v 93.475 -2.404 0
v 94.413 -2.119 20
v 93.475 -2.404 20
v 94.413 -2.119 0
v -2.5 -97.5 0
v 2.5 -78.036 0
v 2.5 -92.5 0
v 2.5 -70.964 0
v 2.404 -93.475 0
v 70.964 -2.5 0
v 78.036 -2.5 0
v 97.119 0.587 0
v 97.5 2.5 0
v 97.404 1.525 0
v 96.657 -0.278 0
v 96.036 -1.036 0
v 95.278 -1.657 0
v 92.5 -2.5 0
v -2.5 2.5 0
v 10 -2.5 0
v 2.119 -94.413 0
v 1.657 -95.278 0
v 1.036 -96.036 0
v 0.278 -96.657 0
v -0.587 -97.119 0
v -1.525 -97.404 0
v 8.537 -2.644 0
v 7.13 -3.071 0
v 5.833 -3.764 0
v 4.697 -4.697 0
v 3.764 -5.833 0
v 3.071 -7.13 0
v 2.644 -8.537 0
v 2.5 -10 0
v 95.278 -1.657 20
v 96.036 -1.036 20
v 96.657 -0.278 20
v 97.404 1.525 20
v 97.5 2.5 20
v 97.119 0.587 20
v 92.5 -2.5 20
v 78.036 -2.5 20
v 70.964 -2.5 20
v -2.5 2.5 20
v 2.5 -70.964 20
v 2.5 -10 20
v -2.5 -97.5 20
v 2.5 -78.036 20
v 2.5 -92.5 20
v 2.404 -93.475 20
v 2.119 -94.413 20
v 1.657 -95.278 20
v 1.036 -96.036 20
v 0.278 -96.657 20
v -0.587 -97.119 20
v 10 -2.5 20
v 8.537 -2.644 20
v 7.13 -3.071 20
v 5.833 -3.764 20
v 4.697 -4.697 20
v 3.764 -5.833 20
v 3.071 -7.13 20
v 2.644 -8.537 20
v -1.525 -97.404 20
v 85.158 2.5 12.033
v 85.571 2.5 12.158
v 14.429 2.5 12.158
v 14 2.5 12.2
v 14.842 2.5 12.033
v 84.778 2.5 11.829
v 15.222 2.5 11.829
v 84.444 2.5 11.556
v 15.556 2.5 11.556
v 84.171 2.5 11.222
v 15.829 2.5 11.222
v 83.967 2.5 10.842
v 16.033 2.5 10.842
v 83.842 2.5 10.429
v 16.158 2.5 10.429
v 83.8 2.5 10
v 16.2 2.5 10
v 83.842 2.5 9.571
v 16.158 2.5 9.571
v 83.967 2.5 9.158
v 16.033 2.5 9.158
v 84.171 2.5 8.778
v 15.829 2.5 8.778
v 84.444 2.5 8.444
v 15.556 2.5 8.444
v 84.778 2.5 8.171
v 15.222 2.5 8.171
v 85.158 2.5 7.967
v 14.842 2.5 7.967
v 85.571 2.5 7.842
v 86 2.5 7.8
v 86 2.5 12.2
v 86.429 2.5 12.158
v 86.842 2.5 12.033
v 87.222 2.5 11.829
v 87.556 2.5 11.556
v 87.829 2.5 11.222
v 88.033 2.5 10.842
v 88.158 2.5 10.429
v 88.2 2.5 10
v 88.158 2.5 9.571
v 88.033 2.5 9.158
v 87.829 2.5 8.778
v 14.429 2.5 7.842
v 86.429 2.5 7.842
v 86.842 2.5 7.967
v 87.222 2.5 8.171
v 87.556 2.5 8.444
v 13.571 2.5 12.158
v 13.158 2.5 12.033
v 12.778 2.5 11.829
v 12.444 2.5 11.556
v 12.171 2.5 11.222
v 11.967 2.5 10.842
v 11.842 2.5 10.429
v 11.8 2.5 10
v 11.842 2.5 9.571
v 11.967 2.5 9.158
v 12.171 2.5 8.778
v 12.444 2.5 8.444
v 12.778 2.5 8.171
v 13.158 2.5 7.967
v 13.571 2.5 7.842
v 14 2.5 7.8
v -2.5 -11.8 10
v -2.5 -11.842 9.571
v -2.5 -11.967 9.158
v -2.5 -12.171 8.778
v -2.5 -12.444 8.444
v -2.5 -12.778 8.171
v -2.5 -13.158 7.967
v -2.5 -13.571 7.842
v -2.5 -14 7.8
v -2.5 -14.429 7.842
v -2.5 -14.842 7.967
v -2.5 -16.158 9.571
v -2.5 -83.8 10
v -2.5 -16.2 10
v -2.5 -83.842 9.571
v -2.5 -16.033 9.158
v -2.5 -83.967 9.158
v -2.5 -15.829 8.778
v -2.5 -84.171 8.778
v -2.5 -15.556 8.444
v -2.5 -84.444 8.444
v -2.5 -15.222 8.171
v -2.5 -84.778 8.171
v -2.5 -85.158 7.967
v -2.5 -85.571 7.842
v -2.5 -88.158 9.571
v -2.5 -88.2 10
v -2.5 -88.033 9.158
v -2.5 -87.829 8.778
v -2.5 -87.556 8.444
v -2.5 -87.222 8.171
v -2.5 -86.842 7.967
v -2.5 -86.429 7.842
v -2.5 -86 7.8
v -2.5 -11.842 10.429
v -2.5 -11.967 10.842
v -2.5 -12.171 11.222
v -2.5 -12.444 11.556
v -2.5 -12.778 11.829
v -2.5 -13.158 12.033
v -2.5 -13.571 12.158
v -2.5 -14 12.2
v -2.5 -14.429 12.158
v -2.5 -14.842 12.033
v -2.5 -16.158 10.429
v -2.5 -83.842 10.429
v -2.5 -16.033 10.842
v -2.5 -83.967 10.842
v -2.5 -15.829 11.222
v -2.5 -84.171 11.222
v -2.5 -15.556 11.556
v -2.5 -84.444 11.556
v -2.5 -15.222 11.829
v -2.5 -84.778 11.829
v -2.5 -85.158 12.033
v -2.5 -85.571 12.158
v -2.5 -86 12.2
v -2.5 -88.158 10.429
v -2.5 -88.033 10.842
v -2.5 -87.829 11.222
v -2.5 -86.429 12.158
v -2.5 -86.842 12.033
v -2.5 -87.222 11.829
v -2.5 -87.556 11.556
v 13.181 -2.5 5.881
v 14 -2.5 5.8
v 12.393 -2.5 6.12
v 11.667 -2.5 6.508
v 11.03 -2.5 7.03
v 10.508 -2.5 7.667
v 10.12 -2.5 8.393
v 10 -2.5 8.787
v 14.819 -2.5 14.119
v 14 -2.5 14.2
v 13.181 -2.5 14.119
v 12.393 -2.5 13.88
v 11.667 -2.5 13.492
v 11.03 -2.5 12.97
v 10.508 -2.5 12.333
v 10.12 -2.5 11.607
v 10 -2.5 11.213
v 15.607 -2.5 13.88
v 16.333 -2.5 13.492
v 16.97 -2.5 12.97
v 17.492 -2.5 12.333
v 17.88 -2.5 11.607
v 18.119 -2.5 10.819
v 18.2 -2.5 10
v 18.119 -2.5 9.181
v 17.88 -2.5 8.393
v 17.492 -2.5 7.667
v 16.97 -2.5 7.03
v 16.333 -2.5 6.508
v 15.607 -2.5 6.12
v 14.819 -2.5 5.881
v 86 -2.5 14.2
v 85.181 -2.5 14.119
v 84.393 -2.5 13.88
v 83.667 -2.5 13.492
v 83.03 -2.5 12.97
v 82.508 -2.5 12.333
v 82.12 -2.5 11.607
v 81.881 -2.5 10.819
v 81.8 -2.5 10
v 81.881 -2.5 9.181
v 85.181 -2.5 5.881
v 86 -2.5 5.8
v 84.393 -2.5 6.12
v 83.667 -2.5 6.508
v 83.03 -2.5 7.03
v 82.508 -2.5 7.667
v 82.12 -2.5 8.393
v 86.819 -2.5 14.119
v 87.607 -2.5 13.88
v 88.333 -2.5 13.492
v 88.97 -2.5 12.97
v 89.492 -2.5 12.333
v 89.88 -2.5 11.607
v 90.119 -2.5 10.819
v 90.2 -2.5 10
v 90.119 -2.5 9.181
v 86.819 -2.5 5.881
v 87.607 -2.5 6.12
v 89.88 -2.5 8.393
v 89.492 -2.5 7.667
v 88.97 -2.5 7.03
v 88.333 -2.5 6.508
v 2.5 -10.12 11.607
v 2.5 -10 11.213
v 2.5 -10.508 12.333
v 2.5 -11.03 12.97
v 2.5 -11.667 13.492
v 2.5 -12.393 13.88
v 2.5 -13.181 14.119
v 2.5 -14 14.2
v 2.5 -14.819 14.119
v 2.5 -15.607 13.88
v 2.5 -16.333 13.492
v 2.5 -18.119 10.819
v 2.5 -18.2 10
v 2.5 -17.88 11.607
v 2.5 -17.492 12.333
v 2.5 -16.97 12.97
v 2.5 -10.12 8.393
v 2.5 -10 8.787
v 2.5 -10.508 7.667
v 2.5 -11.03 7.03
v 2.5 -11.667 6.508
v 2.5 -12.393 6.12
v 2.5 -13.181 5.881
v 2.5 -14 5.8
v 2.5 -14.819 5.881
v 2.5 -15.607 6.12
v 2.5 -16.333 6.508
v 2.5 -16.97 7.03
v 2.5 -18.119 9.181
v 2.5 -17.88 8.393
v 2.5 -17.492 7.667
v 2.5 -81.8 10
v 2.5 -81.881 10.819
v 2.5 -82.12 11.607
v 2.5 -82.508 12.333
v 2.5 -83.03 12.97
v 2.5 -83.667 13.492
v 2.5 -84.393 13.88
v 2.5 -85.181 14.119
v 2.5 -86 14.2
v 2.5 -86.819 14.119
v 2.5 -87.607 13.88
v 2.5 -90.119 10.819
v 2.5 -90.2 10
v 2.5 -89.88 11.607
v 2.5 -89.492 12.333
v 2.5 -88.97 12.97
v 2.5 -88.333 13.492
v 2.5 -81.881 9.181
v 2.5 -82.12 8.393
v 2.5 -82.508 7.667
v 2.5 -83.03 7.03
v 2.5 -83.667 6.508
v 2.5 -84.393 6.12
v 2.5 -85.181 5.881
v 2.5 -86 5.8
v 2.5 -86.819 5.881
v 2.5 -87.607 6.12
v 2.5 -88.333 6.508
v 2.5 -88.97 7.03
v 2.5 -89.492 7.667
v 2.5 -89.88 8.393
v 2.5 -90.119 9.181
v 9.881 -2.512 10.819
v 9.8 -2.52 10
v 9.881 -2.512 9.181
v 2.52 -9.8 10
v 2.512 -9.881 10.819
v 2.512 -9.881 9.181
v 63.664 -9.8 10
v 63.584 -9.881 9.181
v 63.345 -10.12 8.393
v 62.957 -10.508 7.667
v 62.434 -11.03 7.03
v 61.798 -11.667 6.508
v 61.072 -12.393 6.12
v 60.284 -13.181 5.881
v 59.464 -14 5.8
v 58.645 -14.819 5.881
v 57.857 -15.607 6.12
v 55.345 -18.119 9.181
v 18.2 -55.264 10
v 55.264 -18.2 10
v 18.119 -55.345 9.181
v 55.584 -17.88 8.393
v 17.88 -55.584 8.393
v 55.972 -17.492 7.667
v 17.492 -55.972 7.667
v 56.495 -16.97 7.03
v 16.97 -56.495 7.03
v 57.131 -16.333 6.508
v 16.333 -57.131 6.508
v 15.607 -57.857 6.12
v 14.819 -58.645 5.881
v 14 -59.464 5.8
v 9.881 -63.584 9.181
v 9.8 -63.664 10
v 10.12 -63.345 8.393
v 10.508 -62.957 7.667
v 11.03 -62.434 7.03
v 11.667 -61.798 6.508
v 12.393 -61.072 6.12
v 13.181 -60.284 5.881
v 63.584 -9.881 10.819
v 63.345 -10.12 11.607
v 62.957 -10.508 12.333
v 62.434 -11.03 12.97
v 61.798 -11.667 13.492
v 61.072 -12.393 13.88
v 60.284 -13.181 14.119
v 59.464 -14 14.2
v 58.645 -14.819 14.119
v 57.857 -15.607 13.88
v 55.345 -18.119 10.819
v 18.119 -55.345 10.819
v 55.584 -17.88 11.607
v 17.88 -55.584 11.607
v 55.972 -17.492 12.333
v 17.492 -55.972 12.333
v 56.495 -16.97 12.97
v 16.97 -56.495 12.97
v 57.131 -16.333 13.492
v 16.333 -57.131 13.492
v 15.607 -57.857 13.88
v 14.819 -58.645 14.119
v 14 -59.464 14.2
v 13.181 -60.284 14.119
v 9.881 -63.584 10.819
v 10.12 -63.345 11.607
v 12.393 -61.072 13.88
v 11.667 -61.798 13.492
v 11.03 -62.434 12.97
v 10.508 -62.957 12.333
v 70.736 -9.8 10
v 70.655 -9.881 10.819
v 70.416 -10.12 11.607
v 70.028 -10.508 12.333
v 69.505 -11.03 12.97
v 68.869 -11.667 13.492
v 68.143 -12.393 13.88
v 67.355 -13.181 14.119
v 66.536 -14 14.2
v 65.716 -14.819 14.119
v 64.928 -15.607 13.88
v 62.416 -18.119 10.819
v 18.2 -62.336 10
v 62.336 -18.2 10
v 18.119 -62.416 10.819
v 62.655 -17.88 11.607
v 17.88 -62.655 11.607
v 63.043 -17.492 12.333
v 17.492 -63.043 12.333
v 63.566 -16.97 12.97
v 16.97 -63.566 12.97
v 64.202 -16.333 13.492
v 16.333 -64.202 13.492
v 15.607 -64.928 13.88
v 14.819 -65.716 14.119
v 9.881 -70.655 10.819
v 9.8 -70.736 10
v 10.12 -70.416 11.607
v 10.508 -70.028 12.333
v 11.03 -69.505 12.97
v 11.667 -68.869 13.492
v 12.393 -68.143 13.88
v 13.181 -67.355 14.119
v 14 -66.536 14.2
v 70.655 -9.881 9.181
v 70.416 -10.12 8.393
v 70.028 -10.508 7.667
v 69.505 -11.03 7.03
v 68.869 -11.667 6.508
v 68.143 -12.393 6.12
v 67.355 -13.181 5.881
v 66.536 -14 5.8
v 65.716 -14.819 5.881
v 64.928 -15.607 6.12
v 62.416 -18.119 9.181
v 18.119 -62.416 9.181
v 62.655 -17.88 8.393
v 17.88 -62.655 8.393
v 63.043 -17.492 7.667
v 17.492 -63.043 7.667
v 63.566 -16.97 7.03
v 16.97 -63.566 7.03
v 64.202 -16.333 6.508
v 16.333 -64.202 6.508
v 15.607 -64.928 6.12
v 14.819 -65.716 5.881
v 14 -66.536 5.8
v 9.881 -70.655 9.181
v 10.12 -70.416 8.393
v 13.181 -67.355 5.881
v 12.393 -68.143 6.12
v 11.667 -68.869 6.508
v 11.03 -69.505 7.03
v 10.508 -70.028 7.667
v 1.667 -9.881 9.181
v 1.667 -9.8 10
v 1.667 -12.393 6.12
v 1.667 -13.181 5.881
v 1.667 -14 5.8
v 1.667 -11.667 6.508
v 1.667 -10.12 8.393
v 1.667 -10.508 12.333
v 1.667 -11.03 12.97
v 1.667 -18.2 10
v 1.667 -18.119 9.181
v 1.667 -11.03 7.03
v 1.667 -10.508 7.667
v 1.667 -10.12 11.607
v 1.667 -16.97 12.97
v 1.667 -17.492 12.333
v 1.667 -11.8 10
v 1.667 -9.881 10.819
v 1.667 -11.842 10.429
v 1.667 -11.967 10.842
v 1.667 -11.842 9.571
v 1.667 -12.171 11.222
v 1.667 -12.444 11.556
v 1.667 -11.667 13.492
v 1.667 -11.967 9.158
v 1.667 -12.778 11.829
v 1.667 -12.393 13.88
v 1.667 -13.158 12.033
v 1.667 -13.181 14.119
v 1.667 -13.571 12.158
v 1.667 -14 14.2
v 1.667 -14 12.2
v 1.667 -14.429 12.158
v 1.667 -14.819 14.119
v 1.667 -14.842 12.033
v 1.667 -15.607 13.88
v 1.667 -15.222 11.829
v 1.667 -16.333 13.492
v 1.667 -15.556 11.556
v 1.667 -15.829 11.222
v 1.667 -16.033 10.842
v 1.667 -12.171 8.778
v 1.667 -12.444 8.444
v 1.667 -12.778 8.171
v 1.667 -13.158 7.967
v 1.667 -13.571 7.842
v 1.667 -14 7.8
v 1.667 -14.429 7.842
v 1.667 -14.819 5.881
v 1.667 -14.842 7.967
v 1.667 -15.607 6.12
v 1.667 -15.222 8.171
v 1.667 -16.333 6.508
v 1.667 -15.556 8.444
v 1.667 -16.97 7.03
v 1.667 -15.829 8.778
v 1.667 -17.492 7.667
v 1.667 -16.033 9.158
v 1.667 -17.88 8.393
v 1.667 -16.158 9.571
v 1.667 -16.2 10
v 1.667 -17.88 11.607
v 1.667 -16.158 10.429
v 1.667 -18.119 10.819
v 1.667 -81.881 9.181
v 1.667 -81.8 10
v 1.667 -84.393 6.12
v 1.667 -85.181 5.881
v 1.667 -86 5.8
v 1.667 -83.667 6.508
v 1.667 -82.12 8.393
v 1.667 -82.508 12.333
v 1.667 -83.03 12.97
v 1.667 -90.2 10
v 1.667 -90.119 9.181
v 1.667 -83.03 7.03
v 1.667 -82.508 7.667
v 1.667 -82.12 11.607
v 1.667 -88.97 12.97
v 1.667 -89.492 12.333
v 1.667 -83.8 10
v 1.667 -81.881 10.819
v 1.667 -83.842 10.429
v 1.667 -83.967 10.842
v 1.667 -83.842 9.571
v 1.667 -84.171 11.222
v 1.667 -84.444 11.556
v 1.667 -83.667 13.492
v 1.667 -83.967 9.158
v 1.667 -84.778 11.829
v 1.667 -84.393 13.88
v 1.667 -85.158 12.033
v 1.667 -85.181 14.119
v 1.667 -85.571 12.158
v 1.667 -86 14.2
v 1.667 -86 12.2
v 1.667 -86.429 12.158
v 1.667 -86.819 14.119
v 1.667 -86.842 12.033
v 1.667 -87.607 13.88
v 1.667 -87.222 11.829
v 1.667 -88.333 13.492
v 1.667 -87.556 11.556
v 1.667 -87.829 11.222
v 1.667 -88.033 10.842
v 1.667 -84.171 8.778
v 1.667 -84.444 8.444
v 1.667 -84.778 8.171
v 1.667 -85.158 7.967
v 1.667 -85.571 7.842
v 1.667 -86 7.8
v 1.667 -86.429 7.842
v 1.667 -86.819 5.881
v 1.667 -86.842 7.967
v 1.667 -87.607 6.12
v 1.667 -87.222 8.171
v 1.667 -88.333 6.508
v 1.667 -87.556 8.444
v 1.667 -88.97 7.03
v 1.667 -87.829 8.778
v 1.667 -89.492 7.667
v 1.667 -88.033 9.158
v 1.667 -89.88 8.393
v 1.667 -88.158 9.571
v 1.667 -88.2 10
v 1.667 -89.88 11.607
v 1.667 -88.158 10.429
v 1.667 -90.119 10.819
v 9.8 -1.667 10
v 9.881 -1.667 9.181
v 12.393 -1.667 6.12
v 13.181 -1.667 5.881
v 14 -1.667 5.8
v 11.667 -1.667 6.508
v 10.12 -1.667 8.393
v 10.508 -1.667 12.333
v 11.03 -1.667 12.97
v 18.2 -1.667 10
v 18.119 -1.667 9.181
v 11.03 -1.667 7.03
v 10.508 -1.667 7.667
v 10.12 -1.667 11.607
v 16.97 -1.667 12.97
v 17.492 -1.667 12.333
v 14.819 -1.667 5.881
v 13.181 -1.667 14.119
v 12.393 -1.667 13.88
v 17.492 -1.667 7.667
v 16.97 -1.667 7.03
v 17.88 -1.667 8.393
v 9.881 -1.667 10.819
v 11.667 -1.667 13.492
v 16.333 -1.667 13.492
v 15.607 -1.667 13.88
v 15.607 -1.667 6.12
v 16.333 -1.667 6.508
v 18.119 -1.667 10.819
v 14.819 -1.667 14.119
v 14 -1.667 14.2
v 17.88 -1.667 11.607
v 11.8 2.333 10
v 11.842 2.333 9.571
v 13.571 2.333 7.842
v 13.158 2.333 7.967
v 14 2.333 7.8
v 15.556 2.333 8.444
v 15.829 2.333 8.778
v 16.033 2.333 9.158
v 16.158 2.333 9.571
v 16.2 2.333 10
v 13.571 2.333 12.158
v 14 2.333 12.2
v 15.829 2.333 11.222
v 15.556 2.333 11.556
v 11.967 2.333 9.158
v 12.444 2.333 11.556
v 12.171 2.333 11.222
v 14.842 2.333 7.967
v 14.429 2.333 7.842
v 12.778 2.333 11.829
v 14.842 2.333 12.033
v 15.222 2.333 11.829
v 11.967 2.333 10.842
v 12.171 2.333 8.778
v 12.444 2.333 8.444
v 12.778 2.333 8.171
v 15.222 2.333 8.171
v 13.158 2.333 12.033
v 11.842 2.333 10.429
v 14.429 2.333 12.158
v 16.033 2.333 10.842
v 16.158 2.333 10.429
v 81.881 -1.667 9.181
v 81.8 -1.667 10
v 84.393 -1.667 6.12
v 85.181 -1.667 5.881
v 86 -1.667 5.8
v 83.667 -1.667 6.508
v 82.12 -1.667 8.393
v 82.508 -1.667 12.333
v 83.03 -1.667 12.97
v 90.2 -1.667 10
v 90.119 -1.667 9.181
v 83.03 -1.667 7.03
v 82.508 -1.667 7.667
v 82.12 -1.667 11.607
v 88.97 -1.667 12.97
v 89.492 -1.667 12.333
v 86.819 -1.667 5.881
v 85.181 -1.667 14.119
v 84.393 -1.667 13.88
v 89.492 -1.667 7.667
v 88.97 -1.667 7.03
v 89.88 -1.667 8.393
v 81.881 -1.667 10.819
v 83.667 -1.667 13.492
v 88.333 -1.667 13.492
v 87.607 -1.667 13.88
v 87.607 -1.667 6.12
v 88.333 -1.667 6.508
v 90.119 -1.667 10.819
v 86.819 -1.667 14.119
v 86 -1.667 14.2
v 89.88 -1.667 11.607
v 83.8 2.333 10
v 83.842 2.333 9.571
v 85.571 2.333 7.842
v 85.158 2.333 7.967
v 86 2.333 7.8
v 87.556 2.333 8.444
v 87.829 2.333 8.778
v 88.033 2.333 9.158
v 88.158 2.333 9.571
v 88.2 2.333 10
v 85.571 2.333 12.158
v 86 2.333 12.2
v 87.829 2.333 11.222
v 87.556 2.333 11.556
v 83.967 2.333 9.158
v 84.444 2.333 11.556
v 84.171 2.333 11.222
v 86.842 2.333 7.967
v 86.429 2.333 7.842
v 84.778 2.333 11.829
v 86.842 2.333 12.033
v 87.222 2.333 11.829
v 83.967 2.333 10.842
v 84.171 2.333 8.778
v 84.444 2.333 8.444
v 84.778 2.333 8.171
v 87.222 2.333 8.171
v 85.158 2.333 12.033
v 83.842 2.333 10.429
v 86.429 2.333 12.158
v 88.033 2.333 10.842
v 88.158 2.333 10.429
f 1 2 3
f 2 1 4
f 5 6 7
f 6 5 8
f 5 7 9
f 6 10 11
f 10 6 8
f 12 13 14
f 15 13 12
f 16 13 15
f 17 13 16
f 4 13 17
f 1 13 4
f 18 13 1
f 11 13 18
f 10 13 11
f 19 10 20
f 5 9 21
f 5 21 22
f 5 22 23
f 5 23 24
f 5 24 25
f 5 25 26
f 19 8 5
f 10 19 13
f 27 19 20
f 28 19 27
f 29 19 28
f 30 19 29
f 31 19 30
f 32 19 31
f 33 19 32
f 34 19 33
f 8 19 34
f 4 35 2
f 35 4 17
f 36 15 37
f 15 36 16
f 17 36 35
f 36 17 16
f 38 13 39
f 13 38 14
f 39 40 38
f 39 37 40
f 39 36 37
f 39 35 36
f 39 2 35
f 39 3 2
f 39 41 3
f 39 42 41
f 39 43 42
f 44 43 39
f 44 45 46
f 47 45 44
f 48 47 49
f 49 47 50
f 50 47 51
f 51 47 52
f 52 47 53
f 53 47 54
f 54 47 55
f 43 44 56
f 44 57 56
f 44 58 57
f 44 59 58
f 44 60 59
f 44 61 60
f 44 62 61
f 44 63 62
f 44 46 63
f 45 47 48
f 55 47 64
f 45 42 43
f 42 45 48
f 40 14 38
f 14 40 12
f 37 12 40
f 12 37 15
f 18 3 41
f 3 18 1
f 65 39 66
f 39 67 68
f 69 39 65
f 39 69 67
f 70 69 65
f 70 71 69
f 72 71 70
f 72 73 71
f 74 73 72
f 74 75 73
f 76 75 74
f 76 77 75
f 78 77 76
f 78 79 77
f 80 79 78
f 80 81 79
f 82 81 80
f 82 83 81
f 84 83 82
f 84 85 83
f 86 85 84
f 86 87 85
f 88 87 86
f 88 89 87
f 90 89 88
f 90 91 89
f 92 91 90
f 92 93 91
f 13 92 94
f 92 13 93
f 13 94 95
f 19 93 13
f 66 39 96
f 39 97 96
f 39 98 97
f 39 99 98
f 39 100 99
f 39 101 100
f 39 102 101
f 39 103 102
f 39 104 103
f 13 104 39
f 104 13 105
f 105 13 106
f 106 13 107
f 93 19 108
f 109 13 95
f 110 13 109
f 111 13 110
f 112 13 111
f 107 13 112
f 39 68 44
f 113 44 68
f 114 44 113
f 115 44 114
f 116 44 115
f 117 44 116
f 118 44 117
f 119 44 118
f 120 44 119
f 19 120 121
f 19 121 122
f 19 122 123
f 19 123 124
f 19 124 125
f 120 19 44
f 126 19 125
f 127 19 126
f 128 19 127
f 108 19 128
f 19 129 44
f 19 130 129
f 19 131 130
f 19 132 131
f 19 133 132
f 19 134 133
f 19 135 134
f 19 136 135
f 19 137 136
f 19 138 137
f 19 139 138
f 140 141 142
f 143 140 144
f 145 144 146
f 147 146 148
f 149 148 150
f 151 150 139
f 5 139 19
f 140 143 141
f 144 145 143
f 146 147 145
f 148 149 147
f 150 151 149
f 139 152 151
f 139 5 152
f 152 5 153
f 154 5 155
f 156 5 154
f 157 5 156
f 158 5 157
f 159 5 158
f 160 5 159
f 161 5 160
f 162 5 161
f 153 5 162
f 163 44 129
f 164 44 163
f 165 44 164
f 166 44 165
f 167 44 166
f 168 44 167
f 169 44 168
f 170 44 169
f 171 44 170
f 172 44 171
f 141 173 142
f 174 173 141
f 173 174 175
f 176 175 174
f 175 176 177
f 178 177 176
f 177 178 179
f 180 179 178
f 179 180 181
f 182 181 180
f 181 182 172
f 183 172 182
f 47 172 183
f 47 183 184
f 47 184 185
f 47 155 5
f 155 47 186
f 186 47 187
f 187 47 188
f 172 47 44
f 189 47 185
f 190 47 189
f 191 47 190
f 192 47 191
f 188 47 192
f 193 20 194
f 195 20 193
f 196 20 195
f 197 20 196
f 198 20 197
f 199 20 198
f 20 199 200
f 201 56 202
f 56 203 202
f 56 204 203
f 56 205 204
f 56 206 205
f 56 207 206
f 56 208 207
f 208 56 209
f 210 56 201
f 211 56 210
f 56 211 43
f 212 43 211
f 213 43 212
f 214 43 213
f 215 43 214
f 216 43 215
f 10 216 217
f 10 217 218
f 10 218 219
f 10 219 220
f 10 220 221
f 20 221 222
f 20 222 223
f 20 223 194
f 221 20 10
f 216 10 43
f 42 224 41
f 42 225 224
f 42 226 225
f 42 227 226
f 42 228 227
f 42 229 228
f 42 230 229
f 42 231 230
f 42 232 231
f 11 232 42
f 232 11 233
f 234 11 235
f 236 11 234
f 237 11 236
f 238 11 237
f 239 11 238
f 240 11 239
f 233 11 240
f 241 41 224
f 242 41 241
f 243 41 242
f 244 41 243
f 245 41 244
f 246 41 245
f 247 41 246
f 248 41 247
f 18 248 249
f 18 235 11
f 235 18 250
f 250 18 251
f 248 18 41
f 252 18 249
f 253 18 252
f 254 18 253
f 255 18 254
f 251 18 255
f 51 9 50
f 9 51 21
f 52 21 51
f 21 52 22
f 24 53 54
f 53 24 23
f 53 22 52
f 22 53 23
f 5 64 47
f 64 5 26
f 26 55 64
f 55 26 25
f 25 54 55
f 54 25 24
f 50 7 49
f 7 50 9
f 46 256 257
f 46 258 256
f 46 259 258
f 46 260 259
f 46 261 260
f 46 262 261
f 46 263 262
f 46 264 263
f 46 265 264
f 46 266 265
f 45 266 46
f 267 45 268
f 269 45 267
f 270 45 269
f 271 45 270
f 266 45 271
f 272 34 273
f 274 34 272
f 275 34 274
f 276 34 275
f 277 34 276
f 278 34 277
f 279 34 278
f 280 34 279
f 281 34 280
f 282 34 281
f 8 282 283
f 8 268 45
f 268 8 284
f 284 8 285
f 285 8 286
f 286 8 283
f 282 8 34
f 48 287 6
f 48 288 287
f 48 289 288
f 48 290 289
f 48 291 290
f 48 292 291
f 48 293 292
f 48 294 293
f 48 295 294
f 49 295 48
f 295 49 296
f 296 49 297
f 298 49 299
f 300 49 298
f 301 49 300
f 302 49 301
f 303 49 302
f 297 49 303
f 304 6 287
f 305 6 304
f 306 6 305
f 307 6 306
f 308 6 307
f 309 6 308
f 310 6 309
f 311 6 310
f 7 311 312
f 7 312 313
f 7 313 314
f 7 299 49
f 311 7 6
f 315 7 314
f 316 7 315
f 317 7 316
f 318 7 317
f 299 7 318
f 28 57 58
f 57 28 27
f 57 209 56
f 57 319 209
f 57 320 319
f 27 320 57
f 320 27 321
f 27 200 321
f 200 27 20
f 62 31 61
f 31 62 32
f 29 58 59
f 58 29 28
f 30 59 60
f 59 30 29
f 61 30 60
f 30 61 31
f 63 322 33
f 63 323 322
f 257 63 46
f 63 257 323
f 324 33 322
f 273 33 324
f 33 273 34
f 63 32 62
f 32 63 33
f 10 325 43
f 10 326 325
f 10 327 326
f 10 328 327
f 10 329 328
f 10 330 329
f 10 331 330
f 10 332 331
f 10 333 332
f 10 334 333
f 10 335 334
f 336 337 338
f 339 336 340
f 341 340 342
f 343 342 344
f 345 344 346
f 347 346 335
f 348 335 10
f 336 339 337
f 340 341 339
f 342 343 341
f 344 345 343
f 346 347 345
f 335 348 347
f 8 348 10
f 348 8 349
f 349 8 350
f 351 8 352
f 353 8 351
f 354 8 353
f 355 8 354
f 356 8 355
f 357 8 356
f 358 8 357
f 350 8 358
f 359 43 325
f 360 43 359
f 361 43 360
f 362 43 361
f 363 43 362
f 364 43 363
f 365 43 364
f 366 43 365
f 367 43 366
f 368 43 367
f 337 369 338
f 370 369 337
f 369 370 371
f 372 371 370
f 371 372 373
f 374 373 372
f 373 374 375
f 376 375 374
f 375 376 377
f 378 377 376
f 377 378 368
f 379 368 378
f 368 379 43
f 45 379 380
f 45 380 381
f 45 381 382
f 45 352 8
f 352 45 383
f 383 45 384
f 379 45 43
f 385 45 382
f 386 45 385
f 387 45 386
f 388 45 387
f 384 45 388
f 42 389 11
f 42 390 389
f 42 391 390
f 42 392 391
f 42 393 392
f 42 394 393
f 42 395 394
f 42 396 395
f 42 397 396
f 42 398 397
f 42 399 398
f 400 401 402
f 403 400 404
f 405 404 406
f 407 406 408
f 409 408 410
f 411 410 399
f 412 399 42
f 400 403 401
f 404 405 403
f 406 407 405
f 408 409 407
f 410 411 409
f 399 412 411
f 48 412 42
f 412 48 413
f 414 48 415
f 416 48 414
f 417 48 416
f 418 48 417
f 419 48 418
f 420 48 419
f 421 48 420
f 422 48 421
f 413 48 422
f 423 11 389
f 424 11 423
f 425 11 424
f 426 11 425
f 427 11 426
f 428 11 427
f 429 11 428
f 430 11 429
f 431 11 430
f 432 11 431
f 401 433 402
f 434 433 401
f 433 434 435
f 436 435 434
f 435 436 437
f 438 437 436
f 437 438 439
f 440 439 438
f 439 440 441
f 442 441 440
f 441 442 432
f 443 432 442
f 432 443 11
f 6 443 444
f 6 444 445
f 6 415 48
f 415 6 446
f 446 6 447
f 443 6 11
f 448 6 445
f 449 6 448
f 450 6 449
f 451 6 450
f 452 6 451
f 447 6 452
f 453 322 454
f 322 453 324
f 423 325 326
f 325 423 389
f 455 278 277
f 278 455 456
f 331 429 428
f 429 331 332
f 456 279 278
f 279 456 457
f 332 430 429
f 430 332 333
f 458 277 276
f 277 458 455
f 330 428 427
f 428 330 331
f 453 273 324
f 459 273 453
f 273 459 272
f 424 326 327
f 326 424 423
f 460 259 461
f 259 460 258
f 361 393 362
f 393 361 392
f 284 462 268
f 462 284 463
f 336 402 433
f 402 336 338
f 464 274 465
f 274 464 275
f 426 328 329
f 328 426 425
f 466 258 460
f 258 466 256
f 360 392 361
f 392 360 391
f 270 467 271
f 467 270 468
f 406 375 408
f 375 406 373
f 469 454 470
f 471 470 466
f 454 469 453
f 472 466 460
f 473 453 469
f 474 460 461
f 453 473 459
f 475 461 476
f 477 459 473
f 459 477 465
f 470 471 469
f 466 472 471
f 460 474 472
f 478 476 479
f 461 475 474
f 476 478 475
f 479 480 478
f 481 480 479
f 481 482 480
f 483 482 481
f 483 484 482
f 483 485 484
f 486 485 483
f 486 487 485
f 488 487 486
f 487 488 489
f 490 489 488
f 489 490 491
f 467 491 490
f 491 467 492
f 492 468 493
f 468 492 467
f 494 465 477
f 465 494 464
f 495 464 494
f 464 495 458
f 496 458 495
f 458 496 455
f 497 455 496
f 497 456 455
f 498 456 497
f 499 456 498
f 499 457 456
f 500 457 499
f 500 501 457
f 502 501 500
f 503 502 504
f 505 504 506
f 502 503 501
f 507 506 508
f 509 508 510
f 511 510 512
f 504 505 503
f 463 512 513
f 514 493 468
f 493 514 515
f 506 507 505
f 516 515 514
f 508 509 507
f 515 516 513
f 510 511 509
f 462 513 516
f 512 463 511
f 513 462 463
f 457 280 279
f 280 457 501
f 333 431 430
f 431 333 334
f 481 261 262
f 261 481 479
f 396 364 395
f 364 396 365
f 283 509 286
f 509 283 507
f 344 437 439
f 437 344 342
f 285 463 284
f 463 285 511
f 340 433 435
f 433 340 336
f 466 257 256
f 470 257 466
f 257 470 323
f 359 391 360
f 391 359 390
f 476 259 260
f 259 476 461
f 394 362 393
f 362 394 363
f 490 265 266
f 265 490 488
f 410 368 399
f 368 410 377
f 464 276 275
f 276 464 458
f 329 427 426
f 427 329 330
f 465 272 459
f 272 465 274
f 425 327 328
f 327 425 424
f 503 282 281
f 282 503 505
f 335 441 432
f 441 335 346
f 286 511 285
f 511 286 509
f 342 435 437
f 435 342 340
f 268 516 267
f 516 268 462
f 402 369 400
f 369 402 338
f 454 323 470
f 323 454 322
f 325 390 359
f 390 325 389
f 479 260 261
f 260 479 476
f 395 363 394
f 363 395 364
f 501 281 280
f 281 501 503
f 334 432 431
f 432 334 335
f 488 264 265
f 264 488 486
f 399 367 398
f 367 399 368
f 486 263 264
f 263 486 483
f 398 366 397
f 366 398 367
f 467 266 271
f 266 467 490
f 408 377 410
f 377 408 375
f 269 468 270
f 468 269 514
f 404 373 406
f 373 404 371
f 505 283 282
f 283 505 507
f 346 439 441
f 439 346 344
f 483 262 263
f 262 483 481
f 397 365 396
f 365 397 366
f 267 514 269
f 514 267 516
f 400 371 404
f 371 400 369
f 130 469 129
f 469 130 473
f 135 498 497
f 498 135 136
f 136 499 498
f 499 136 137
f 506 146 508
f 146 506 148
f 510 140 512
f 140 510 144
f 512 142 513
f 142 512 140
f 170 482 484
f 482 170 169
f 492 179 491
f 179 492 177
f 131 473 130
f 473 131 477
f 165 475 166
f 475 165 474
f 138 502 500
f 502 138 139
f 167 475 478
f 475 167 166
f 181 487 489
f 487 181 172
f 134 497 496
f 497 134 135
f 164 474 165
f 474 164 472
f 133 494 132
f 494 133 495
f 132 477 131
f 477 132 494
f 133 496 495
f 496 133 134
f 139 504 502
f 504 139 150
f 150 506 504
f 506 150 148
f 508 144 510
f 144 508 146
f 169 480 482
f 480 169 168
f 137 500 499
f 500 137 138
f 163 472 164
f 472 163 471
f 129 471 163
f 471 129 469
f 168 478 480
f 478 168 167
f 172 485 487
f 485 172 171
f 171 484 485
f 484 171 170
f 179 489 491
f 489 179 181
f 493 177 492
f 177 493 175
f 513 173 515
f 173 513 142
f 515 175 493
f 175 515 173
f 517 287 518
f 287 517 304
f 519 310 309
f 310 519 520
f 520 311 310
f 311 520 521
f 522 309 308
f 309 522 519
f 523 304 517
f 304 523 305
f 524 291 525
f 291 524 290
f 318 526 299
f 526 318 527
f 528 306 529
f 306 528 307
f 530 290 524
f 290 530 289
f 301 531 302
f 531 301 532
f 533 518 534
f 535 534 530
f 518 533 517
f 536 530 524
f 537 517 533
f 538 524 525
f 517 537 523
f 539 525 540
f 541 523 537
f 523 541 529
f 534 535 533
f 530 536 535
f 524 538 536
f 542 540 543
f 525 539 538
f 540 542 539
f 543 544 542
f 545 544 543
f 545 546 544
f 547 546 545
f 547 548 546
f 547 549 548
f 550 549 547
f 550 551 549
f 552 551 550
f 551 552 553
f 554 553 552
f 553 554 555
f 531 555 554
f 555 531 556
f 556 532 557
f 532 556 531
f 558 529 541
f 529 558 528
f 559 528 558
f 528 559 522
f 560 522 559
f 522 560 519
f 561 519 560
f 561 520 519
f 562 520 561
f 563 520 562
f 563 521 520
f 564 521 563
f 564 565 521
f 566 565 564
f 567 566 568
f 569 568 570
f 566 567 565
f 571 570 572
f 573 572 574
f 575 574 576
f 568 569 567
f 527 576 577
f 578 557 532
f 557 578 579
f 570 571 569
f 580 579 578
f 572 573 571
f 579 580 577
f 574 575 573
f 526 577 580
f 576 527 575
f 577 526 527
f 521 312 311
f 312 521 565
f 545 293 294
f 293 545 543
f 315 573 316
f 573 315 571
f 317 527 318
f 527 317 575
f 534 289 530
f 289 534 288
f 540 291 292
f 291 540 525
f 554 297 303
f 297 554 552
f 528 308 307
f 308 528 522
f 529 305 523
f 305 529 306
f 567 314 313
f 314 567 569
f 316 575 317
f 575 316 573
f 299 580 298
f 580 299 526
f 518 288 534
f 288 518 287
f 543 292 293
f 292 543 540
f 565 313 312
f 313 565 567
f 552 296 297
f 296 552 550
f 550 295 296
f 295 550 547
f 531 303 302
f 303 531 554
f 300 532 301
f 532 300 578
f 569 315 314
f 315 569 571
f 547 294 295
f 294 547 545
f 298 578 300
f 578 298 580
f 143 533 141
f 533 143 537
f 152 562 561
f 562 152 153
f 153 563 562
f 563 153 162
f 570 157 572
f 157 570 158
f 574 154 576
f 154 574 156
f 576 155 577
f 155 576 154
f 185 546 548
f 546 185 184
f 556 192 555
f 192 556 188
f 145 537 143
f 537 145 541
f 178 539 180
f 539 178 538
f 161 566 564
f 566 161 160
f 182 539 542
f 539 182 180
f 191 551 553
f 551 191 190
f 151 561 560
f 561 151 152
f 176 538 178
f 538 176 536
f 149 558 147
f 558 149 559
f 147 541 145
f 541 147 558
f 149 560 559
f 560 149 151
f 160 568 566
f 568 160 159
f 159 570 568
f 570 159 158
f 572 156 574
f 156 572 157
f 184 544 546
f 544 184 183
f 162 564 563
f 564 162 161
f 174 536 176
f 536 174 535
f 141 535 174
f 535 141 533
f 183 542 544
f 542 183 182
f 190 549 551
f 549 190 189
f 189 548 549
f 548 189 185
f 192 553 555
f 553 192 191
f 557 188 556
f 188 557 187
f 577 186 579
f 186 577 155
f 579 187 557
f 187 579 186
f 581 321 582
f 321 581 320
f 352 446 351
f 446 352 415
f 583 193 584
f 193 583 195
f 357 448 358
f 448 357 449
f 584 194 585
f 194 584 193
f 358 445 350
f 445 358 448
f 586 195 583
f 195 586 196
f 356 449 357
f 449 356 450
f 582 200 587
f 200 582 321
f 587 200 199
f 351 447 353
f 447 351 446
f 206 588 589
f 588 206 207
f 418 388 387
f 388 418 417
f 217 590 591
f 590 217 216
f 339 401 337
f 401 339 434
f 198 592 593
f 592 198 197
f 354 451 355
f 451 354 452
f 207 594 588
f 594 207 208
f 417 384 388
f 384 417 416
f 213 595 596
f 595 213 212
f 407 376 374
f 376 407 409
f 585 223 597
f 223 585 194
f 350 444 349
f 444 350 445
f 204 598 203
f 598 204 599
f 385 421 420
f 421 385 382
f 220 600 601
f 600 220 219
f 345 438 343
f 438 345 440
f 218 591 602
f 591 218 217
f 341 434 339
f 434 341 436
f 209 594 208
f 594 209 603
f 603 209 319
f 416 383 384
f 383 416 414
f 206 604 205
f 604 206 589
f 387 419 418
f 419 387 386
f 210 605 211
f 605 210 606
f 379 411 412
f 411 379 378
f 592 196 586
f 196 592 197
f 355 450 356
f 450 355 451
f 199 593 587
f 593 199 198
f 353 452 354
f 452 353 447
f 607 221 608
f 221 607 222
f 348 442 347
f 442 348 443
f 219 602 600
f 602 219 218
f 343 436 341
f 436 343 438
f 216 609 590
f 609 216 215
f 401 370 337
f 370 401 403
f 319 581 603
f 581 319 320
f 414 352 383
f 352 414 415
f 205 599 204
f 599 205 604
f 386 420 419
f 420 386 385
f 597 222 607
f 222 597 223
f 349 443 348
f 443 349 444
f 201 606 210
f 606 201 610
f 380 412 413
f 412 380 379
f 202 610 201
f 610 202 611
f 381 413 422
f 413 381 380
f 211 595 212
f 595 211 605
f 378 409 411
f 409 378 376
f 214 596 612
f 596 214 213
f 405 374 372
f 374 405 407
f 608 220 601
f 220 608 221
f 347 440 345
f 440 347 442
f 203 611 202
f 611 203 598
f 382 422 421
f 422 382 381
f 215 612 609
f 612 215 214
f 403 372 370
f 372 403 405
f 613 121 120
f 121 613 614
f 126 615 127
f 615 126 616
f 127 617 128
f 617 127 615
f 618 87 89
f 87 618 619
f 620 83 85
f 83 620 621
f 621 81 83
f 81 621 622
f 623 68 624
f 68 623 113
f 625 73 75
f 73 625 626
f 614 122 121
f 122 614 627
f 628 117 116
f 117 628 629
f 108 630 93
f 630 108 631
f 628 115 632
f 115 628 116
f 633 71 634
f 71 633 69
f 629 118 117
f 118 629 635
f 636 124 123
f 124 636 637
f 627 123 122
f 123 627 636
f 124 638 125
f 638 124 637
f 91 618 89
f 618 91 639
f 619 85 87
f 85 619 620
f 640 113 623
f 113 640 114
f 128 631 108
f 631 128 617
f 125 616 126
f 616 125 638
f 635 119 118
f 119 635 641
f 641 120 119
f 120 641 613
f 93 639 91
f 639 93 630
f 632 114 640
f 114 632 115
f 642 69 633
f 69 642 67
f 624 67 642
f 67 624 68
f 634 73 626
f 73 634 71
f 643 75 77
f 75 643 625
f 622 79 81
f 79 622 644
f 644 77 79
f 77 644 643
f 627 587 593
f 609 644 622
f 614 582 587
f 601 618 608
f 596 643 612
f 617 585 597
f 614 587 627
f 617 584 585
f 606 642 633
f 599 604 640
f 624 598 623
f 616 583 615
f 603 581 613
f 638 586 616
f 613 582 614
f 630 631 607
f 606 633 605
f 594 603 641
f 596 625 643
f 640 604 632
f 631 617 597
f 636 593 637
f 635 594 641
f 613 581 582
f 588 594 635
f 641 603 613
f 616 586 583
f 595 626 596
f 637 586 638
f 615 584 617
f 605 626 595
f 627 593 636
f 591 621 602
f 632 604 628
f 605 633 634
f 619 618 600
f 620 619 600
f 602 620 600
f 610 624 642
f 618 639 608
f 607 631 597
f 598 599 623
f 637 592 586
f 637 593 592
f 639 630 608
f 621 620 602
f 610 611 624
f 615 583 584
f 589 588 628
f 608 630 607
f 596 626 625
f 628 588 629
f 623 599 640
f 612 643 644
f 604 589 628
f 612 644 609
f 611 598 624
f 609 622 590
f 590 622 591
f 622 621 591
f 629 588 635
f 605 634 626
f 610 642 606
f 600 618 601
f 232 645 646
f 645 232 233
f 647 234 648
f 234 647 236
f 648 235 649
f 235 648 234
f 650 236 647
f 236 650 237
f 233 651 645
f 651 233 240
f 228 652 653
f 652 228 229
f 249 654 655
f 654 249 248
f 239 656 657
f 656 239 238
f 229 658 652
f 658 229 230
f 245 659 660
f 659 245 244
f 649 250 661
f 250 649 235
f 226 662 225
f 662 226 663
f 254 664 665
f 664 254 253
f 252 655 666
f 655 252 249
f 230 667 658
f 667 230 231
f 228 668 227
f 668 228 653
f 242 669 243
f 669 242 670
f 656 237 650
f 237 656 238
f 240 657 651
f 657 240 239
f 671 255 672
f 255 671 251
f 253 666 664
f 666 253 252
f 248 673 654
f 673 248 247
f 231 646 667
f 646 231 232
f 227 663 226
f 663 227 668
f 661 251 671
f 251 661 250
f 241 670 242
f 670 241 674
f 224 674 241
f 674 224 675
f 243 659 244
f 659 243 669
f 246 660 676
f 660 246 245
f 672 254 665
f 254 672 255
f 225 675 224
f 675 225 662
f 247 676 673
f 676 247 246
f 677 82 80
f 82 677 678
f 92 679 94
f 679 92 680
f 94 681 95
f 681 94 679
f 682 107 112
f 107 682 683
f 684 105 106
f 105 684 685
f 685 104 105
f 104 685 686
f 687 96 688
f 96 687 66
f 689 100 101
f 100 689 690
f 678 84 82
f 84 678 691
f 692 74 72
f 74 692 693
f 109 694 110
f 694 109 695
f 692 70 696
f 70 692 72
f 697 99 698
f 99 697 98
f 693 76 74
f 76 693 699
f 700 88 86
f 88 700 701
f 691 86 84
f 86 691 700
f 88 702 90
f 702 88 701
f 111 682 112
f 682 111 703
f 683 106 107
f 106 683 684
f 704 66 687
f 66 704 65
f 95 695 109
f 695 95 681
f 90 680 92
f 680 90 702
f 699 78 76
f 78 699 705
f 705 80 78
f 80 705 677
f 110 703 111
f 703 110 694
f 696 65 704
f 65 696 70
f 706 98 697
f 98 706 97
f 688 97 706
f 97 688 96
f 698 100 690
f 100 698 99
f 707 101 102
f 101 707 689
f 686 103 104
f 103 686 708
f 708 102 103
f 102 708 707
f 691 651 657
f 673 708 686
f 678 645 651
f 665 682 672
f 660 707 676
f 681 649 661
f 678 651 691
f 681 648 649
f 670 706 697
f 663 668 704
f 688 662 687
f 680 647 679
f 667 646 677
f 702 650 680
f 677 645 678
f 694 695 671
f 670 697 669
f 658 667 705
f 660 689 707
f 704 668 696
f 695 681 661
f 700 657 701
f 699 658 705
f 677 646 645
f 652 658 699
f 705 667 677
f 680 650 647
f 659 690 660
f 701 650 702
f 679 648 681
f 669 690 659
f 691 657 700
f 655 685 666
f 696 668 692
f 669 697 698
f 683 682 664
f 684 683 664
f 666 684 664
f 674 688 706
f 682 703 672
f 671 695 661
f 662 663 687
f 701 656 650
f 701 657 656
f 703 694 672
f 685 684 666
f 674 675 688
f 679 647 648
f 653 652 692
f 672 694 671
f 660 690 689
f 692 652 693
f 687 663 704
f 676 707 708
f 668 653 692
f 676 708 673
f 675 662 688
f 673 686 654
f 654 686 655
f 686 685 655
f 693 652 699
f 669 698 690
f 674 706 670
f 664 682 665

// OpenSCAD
// shelf_bracket.scad
// library for parametric wall shelf brackets
// Author: Tony Z. Tonchev, Michigan (USA) 
// last update: November 2018



// (in mm)
Bracket_Width = 100; // [50:200]

// (in mm)
Bracket_Height = 20; //[15:50]

// (in mm)
Bracket_Thickness = 5; //[5:10]

// (in mm)
Side_A_Screw_Diameter = 4.0; //[3.0:0.1:6.0]

// (in mm)
Side_A_Screw_Head_Diameter = 8.0; //[6.0:0.1:10.0]

Side_A_Countersunk = 0; // [0:false, 1:true]

// (in mm)
Side_B_Screw_Diameter = 4.0; //[3.0:0.1:6.0]

// (in mm)
Side_B_Screw_Head_Diameter = 8.0; //[6.0:0.1:10.0]

Side_B_Countersunk = 1; // [0:false, 1:true]

Fit_Tolerance = 0.2;

/* [Hidden] */

TZT_W=Bracket_Width;
TZT_H=Bracket_Height;
TZT_T=Bracket_Thickness;

//-----------------------

TZT_Bracket ();

//-----------------------

module TZT_Bracket () {
    difference () {
        intersection () {
            union () {
                TZT_BBeam ();
                rotate ([0,0,-90]) mirror ([0,1,0]) TZT_BBeam ();
                $fn=32;
                difference () {
                    translate ([0,-TZT_T*2,0]) cube ([TZT_T*2,TZT_T*2,TZT_H]);
                    translate ([TZT_T*2,-TZT_T*2,-1]) cylinder (TZT_H+2,TZT_T*1.5,TZT_T*1.5); 
                }
                TZT_B1 ();
            }
            TZT_BTrim ();
        }
        TZT_BMount ();
    }
    
    module TZT_B1 () {
        TZT_BSupport ([TZT_W-TZT_T*3-Side_A_Screw_Head_Diameter,TZT_W-TZT_T*3-Side_B_Screw_Head_Diameter]);
    }
    module TZT_BBeam () {
        translate ([-TZT_T/2,-TZT_T/2,0]) {
            intersection () {
                translate ([TZT_W-TZT_T,TZT_T,0]) cylinder (TZT_H,TZT_T,TZT_T);
                cube ([TZT_W,TZT_T,TZT_H]);
            }
            cube ([TZT_W-TZT_T,TZT_T,TZT_H]);
        }
    }
    module TZT_BSupport (TZT) {
        hull () {
            translate ([TZT[0],0,0]) cylinder (TZT_H, TZT_T/2, TZT_T/2);
            translate ([0,-TZT[1],0]) cylinder (TZT_H, TZT_T/2, TZT_T/2);
        }
    }
    module TZT_BTrim () {
        translate ([-TZT_T/2,-TZT_W+TZT_T/2,0]) cube ([TZT_W, TZT_W, TZT_H]);
    }
    module TZT_BMount () {
        $fn=32;
        translate ([TZT_T/3,-TZT_W*.1-Side_A_Screw_Head_Diameter/2,TZT_H/2]) TZT_BMHole (Side_A_Screw_Diameter, Side_A_Screw_Head_Diameter, Side_A_Countersunk);
        translate ([TZT_T/3,-TZT_W*.9+Side_A_Screw_Head_Diameter/2,TZT_H/2]) TZT_BMHole (Side_A_Screw_Diameter, Side_A_Screw_Head_Diameter, Side_A_Countersunk);
        rotate (90,0,0) mirror ([1,0,0]) {
            translate ([TZT_T/3,-TZT_W*.1-Side_B_Screw_Head_Diameter/2,TZT_H/2]) TZT_BMHole (Side_B_Screw_Diameter, Side_B_Screw_Head_Diameter, Side_B_Countersunk);
            translate ([TZT_T/3,-TZT_W*.9+Side_B_Screw_Head_Diameter/2,TZT_H/2]) TZT_BMHole (Side_B_Screw_Diameter, Side_B_Screw_Head_Diameter, Side_B_Countersunk);
        }
        module TZT_BMHole (Screw_Diameter, Screw_Head_Diameter, Countersunk) {
            rotate ([0,90,0]) { 
                cylinder (TZT_W, d=Screw_Head_Diameter + Fit_Tolerance * 2);
                translate ([0,0,-TZT_T*2]) cylinder (TZT_W, d=Screw_Diameter + Fit_Tolerance * 2);
                if (Countersunk) {
                    hull() {
                        delta = Screw_Head_Diameter - Screw_Diameter;
                        cylinder (1, d=Screw_Head_Diameter + Fit_Tolerance * 2);
                        translate ([0,0,-delta]) cylinder (1e-6, d=Screw_Diameter + Fit_Tolerance * 2);
                    }
                }
            }
        }
    }
}
